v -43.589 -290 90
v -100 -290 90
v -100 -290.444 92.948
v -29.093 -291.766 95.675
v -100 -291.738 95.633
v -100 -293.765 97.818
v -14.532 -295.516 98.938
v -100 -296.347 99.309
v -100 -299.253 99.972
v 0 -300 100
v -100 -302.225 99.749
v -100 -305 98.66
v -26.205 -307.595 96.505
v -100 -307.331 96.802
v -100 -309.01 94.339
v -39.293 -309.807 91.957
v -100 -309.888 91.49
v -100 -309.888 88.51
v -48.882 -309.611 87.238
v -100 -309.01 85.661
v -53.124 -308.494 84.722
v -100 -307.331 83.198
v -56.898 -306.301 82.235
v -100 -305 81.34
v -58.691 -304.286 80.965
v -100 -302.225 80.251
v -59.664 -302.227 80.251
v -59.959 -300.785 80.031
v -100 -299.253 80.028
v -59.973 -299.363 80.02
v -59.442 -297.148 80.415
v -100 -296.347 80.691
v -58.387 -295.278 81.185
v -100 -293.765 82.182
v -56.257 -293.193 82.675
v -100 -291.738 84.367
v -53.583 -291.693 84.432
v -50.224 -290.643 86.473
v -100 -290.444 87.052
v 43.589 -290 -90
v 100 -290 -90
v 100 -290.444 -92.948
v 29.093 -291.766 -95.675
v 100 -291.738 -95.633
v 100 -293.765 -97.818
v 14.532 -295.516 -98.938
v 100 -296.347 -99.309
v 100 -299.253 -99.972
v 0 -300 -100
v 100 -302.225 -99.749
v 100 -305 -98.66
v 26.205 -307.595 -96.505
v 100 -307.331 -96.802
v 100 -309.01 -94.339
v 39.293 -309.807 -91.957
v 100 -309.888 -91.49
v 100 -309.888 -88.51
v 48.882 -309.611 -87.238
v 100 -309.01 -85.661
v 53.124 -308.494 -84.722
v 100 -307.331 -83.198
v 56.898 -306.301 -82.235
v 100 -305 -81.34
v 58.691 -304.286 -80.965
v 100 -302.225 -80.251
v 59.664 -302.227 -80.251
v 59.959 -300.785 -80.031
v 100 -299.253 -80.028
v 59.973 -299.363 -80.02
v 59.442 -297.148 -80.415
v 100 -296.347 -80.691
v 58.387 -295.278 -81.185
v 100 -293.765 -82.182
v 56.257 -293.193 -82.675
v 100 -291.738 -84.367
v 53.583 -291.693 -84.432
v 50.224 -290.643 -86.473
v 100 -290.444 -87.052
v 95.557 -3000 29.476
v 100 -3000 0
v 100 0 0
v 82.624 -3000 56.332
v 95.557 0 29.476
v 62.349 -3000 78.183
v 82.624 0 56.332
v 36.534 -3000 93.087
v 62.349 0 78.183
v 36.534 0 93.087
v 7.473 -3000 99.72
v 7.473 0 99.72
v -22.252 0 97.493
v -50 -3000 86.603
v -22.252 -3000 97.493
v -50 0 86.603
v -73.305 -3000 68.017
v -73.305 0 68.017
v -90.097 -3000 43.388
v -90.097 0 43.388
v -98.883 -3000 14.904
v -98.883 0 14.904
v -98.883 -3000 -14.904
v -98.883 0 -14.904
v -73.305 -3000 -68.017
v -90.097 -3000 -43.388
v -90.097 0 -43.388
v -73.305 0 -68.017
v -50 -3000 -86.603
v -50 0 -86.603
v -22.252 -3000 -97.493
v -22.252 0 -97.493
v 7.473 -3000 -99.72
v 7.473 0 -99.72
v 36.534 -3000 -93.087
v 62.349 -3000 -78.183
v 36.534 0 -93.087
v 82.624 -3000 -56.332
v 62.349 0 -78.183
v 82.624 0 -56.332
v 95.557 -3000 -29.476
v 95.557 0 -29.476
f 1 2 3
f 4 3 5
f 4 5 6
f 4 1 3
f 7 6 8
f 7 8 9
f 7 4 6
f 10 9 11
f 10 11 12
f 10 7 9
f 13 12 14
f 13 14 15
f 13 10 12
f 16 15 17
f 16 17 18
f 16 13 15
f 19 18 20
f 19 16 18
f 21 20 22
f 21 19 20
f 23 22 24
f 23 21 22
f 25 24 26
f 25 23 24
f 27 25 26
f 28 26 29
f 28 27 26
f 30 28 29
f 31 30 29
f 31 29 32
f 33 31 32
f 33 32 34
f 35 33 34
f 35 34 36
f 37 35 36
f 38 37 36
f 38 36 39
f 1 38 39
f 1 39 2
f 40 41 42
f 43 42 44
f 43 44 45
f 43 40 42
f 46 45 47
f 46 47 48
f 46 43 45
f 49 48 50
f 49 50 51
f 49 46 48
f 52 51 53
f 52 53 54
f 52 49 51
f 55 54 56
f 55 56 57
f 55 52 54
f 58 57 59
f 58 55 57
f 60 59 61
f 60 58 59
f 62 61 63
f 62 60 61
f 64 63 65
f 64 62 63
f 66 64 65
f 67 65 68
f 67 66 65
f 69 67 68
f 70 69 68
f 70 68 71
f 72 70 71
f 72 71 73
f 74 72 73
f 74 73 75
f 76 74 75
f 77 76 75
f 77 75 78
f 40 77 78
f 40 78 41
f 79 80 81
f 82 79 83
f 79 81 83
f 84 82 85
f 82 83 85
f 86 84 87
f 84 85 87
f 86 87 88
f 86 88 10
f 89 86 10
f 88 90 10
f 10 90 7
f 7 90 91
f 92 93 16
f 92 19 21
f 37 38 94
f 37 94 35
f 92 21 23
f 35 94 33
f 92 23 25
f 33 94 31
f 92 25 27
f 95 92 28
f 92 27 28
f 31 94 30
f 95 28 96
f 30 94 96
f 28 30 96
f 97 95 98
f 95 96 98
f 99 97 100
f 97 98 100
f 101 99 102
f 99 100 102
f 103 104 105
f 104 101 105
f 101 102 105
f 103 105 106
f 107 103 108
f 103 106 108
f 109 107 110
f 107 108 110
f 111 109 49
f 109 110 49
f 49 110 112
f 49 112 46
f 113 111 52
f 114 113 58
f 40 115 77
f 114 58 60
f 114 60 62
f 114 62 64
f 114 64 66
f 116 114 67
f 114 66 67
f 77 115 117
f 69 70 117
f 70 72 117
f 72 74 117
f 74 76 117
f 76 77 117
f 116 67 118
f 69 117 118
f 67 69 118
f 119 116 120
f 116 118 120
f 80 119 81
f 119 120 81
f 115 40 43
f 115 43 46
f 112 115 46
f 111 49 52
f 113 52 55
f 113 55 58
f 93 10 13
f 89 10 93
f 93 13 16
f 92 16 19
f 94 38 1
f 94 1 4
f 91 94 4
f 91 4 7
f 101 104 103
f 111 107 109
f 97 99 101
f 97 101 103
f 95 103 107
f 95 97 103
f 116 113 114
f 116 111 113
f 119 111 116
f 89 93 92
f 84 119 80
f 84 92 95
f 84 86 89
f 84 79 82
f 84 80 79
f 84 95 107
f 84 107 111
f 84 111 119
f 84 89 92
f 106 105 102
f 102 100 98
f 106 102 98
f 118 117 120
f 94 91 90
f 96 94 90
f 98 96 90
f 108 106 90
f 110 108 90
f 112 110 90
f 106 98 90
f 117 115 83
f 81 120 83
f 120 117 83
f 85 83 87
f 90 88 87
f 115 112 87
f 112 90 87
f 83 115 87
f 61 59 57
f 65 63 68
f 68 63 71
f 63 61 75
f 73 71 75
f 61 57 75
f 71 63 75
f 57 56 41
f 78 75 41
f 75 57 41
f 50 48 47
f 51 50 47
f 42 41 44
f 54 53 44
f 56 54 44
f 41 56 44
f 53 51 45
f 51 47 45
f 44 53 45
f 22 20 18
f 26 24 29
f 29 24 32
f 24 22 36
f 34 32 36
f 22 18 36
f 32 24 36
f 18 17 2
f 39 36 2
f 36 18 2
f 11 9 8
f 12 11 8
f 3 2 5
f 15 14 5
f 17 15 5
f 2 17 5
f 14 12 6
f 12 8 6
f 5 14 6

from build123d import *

# Parameters (mm, degrees)
F0_R     = 100
F1_DEPTH = 3000
F2_R     = 10
F3_DEPTH = 100
F4_COUNT = 2


with BuildPart() as f1:
    # F0 (on Front) → F1 (new body)
    with BuildSketch(Plane.XZ):
        Circle(F0_R)
    extrude(amount=F1_DEPTH)

    # F2 (on Right) → F3 (join)
    with BuildSketch(Plane.YZ):
        with Locations((-300, 90)):
            Circle(F2_R)
    extrude(amount=-F3_DEPTH)

    # F4: F1 ×2 about axis
    f4_axis = Axis((0, 0, 0), (0, 1, 0))


with BuildPart() as f1_1:
    add(f1.part)
    for i in range(1, F4_COUNT):
        add(f1.part.rotate(f4_axis, i * 360 / F4_COUNT))


solid = f1_1.part
